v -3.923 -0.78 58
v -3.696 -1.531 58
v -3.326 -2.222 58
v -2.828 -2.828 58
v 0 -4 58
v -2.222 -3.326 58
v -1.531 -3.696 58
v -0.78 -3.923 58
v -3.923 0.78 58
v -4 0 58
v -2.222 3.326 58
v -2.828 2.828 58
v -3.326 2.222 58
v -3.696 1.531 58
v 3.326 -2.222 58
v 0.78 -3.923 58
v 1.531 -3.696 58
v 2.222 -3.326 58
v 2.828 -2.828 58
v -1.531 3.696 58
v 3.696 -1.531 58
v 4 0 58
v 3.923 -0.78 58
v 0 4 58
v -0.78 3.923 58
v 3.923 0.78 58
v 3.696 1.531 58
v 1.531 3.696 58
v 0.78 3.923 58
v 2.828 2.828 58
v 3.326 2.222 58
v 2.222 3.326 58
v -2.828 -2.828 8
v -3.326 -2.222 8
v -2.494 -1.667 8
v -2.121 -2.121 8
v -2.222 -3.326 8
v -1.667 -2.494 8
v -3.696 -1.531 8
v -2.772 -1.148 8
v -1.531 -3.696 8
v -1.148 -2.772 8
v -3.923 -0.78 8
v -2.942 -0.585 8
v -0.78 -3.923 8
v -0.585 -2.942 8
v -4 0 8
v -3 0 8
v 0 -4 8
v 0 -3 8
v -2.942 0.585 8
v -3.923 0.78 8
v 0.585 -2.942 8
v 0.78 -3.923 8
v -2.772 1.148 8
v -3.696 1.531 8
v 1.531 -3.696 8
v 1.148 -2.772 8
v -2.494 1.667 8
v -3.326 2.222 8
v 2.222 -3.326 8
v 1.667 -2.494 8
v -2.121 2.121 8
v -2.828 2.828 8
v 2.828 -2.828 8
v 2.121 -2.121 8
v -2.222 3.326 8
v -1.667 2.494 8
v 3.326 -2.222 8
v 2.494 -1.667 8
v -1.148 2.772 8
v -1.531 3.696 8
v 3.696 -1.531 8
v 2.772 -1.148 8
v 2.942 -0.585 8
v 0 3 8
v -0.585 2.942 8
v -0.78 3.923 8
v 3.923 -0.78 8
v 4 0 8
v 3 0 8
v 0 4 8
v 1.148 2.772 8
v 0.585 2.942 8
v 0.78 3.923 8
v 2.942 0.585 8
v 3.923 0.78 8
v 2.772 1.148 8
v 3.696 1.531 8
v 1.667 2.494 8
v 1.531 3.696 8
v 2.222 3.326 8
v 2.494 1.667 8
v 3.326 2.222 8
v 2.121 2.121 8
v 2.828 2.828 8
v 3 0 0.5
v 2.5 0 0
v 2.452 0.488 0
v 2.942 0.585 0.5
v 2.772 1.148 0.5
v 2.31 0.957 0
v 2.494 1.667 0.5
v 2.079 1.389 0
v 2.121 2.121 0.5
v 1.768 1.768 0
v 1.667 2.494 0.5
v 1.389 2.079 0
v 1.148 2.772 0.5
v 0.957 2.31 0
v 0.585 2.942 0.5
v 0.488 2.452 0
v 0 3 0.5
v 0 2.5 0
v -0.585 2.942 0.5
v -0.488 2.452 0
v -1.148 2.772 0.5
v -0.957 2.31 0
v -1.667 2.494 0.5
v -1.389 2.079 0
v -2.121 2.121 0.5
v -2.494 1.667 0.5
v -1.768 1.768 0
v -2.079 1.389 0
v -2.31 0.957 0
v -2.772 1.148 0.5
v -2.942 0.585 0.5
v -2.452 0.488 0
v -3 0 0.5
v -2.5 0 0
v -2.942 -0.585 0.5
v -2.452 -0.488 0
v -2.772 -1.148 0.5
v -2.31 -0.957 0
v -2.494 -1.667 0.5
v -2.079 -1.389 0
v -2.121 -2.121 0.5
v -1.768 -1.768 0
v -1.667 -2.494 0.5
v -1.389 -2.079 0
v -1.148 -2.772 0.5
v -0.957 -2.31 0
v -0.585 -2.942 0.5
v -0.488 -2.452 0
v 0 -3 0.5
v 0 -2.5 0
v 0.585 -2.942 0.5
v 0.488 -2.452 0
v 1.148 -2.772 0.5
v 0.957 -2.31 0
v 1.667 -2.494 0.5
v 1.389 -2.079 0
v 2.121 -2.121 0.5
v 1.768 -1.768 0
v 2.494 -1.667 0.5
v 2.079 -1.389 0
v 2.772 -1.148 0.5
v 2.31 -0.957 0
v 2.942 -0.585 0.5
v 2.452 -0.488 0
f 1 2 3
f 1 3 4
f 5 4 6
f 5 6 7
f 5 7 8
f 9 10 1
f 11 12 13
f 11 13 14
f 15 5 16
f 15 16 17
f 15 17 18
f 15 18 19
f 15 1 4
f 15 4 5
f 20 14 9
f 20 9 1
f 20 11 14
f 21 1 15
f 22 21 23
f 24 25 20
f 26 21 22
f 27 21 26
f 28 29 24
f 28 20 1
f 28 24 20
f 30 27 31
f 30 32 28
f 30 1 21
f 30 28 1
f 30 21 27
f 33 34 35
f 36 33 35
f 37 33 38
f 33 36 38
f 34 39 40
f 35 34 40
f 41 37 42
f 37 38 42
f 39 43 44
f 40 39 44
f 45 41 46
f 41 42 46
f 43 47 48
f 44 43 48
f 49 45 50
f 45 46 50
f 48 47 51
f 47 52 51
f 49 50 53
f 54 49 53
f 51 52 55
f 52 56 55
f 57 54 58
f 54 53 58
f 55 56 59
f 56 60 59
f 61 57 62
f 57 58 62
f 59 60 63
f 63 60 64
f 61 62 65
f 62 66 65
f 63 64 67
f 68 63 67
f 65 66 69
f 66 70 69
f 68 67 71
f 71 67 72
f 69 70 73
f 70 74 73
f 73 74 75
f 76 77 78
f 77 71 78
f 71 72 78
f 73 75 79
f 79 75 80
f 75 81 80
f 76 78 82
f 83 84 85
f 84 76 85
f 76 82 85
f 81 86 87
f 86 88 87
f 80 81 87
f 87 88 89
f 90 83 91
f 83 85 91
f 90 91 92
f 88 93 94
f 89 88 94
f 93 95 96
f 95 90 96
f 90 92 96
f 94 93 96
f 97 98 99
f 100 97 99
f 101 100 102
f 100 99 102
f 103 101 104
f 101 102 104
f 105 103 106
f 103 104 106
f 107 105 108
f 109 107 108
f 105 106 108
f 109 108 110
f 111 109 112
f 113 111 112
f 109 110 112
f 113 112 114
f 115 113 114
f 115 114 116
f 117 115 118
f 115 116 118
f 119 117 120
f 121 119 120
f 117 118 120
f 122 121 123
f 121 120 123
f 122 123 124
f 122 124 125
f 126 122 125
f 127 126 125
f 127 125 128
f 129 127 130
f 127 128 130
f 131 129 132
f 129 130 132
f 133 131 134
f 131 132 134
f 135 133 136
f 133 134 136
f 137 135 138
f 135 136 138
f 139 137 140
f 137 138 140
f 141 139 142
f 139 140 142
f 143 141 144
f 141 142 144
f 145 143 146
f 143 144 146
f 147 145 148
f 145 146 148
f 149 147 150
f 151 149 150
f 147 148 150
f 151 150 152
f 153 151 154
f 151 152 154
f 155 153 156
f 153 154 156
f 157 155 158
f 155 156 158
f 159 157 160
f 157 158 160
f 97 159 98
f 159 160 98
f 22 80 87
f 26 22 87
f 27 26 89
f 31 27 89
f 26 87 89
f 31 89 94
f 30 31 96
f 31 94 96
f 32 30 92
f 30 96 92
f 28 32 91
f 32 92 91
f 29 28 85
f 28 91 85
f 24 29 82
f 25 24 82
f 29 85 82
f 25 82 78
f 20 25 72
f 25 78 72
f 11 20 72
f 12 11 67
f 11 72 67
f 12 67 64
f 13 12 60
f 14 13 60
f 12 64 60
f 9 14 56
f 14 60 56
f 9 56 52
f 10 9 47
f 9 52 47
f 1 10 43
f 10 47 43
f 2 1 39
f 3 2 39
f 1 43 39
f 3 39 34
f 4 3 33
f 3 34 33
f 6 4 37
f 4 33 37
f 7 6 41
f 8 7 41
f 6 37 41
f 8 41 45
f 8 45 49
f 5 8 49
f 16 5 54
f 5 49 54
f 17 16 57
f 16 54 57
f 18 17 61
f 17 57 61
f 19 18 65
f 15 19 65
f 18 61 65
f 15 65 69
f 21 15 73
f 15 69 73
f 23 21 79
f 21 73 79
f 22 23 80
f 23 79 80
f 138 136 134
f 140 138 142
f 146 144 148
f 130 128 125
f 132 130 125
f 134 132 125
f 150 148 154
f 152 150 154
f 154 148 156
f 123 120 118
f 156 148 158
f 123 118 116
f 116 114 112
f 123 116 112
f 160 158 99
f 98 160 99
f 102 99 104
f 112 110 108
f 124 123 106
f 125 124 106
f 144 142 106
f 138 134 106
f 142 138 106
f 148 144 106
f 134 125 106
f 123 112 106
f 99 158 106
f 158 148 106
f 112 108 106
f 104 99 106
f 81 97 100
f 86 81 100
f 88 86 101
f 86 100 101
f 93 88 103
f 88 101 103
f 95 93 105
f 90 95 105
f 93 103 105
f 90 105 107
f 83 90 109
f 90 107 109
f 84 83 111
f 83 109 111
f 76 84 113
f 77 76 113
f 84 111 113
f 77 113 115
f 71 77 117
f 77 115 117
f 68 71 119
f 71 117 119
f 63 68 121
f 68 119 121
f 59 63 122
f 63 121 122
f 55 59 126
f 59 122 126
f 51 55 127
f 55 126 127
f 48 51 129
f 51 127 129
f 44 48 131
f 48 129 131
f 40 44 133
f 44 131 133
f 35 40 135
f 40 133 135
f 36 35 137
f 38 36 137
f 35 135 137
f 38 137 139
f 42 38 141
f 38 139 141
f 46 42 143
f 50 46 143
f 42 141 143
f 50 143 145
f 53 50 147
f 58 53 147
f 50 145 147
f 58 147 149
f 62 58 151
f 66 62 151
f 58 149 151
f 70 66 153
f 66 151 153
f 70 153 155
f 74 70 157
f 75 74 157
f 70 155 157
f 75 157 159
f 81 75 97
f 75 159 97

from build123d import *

# Parameters (mm, degrees)
ESQUISSE1_R        = 3
BOSS_EXTRU_1_DEPTH = 8
CHANFREIN1_SIZE    = 0.5
ESQUISSE2_R        = 4
BOSS_EXTRU_2_DEPTH = 50


with BuildPart() as part:
    # Esquisse1 → Boss.-Extru.1 (new body)
    with BuildSketch(Plane.XY):
        Circle(ESQUISSE1_R)
    extrude(amount=BOSS_EXTRU_1_DEPTH)

    # Chanfrein1
    chanfrein1_edges = [part.edges().sort_by_distance(p)[0] for p in [
        (-3, 0, 0),
    ]]
    chamfer(chanfrein1_edges, length=CHANFREIN1_SIZE)

    # Esquisse2 → Boss.-Extru.2 (add)
    with BuildSketch(Plane.XY.offset(8)):
        Circle(ESQUISSE2_R)
    extrude(amount=BOSS_EXTRU_2_DEPTH)


solid = part.part
